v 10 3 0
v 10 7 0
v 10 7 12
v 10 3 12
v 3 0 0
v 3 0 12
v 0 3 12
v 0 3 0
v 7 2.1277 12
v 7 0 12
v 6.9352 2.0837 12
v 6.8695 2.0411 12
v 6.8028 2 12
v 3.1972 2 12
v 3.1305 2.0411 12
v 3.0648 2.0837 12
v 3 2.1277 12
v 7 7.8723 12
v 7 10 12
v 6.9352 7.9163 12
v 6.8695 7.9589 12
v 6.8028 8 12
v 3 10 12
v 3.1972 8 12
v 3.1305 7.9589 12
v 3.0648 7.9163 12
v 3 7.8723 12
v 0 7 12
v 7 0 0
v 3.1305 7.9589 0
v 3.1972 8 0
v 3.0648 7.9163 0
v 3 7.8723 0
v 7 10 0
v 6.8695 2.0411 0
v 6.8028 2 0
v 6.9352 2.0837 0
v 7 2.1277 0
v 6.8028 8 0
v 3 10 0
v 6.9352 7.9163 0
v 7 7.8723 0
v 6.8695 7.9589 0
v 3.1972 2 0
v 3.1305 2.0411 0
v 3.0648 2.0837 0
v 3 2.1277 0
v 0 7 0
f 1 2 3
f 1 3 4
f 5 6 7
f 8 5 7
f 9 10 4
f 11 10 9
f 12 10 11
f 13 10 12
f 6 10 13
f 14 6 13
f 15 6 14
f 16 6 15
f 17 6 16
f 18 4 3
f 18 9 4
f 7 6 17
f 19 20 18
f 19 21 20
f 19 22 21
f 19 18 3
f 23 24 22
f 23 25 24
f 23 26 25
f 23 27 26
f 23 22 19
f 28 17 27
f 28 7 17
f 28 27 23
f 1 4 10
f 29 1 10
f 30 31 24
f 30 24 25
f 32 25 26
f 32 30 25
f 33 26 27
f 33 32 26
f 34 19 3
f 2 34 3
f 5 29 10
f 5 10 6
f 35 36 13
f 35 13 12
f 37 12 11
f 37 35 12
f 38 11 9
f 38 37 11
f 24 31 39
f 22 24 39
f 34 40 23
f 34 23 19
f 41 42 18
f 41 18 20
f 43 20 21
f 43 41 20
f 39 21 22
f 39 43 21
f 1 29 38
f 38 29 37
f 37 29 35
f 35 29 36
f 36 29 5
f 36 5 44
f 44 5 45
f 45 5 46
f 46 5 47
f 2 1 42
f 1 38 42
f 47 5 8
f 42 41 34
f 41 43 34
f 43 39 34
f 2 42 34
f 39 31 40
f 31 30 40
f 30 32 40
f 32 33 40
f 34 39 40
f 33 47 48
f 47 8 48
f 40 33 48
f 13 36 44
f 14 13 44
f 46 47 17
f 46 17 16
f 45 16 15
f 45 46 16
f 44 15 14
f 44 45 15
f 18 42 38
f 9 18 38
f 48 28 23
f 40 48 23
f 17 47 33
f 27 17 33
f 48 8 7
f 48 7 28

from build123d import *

# Parameters (mm, degrees)
SKETCH1_R           = 3.5
BOSS_EXTRUDE1_DEPTH = 12


with BuildPart() as part:
    # Sketch1 → Boss-Extrude1 (new body)
    # profile 1 of 5: a face of its own
    with BuildSketch(Plane(origin=(0, 0, 0), x_dir=(0, 1, 0), z_dir=(0, 0, 1))):
        Polygon((10, -3), (10, -7), (7, -10), (3, -10), (0, -7), (0, -3), (3, 0), (7, 0), align=None)
        with Locations((5, -5)):
            Circle(SKETCH1_R, mode=Mode.SUBTRACT)
    # profile 2 of 5: a face of its own
    with BuildSketch(Plane(origin=(0, 0, 0), x_dir=(0, 1, 0), z_dir=(0, 0, 1))):
        with BuildLine():
            ThreePointArc((7.872281323, -3), (5, -1.5), (2.127718677, -3))
            Line((2.127718677, -3), (7.872281323, -3))
        make_face()
    # profile 3 of 5: a face of its own
    with BuildSketch(Plane(origin=(0, 0, 0), x_dir=(0, 1, 0), z_dir=(0, 0, 1))):
        with BuildLine():
            Line((7.872281323, -7), (2.127718677, -7))
            ThreePointArc((2.127718677, -7), (5, -8.5), (7.872281323, -7))
        make_face()
    # profile 4 of 5: a face of its own
    with BuildSketch(Plane(origin=(0, 0, 0), x_dir=(0, 1, 0), z_dir=(0, 0, 1))):
        with BuildLine():
            Line((2, -6.802775638), (2, -3.197224362))
            ThreePointArc((2, -3.197224362), (1.5, -5), (2, -6.802775638))
        make_face()
    # profile 5 of 5: a face of its own
    with BuildSketch(Plane(origin=(0, 0, 0), x_dir=(0, 1, 0), z_dir=(0, 0, 1))):
        with BuildLine():
            ThreePointArc((8.5, -5), (8.372684391, -4.064585653), (8, -3.197224362))
            Line((8, -3.197224362), (8, -6.802775638))
            ThreePointArc((8, -6.802775638), (8.372684391, -5.935414347), (8.5, -5))
        make_face()
    extrude(amount=BOSS_EXTRUDE1_DEPTH)


solid = part.part
